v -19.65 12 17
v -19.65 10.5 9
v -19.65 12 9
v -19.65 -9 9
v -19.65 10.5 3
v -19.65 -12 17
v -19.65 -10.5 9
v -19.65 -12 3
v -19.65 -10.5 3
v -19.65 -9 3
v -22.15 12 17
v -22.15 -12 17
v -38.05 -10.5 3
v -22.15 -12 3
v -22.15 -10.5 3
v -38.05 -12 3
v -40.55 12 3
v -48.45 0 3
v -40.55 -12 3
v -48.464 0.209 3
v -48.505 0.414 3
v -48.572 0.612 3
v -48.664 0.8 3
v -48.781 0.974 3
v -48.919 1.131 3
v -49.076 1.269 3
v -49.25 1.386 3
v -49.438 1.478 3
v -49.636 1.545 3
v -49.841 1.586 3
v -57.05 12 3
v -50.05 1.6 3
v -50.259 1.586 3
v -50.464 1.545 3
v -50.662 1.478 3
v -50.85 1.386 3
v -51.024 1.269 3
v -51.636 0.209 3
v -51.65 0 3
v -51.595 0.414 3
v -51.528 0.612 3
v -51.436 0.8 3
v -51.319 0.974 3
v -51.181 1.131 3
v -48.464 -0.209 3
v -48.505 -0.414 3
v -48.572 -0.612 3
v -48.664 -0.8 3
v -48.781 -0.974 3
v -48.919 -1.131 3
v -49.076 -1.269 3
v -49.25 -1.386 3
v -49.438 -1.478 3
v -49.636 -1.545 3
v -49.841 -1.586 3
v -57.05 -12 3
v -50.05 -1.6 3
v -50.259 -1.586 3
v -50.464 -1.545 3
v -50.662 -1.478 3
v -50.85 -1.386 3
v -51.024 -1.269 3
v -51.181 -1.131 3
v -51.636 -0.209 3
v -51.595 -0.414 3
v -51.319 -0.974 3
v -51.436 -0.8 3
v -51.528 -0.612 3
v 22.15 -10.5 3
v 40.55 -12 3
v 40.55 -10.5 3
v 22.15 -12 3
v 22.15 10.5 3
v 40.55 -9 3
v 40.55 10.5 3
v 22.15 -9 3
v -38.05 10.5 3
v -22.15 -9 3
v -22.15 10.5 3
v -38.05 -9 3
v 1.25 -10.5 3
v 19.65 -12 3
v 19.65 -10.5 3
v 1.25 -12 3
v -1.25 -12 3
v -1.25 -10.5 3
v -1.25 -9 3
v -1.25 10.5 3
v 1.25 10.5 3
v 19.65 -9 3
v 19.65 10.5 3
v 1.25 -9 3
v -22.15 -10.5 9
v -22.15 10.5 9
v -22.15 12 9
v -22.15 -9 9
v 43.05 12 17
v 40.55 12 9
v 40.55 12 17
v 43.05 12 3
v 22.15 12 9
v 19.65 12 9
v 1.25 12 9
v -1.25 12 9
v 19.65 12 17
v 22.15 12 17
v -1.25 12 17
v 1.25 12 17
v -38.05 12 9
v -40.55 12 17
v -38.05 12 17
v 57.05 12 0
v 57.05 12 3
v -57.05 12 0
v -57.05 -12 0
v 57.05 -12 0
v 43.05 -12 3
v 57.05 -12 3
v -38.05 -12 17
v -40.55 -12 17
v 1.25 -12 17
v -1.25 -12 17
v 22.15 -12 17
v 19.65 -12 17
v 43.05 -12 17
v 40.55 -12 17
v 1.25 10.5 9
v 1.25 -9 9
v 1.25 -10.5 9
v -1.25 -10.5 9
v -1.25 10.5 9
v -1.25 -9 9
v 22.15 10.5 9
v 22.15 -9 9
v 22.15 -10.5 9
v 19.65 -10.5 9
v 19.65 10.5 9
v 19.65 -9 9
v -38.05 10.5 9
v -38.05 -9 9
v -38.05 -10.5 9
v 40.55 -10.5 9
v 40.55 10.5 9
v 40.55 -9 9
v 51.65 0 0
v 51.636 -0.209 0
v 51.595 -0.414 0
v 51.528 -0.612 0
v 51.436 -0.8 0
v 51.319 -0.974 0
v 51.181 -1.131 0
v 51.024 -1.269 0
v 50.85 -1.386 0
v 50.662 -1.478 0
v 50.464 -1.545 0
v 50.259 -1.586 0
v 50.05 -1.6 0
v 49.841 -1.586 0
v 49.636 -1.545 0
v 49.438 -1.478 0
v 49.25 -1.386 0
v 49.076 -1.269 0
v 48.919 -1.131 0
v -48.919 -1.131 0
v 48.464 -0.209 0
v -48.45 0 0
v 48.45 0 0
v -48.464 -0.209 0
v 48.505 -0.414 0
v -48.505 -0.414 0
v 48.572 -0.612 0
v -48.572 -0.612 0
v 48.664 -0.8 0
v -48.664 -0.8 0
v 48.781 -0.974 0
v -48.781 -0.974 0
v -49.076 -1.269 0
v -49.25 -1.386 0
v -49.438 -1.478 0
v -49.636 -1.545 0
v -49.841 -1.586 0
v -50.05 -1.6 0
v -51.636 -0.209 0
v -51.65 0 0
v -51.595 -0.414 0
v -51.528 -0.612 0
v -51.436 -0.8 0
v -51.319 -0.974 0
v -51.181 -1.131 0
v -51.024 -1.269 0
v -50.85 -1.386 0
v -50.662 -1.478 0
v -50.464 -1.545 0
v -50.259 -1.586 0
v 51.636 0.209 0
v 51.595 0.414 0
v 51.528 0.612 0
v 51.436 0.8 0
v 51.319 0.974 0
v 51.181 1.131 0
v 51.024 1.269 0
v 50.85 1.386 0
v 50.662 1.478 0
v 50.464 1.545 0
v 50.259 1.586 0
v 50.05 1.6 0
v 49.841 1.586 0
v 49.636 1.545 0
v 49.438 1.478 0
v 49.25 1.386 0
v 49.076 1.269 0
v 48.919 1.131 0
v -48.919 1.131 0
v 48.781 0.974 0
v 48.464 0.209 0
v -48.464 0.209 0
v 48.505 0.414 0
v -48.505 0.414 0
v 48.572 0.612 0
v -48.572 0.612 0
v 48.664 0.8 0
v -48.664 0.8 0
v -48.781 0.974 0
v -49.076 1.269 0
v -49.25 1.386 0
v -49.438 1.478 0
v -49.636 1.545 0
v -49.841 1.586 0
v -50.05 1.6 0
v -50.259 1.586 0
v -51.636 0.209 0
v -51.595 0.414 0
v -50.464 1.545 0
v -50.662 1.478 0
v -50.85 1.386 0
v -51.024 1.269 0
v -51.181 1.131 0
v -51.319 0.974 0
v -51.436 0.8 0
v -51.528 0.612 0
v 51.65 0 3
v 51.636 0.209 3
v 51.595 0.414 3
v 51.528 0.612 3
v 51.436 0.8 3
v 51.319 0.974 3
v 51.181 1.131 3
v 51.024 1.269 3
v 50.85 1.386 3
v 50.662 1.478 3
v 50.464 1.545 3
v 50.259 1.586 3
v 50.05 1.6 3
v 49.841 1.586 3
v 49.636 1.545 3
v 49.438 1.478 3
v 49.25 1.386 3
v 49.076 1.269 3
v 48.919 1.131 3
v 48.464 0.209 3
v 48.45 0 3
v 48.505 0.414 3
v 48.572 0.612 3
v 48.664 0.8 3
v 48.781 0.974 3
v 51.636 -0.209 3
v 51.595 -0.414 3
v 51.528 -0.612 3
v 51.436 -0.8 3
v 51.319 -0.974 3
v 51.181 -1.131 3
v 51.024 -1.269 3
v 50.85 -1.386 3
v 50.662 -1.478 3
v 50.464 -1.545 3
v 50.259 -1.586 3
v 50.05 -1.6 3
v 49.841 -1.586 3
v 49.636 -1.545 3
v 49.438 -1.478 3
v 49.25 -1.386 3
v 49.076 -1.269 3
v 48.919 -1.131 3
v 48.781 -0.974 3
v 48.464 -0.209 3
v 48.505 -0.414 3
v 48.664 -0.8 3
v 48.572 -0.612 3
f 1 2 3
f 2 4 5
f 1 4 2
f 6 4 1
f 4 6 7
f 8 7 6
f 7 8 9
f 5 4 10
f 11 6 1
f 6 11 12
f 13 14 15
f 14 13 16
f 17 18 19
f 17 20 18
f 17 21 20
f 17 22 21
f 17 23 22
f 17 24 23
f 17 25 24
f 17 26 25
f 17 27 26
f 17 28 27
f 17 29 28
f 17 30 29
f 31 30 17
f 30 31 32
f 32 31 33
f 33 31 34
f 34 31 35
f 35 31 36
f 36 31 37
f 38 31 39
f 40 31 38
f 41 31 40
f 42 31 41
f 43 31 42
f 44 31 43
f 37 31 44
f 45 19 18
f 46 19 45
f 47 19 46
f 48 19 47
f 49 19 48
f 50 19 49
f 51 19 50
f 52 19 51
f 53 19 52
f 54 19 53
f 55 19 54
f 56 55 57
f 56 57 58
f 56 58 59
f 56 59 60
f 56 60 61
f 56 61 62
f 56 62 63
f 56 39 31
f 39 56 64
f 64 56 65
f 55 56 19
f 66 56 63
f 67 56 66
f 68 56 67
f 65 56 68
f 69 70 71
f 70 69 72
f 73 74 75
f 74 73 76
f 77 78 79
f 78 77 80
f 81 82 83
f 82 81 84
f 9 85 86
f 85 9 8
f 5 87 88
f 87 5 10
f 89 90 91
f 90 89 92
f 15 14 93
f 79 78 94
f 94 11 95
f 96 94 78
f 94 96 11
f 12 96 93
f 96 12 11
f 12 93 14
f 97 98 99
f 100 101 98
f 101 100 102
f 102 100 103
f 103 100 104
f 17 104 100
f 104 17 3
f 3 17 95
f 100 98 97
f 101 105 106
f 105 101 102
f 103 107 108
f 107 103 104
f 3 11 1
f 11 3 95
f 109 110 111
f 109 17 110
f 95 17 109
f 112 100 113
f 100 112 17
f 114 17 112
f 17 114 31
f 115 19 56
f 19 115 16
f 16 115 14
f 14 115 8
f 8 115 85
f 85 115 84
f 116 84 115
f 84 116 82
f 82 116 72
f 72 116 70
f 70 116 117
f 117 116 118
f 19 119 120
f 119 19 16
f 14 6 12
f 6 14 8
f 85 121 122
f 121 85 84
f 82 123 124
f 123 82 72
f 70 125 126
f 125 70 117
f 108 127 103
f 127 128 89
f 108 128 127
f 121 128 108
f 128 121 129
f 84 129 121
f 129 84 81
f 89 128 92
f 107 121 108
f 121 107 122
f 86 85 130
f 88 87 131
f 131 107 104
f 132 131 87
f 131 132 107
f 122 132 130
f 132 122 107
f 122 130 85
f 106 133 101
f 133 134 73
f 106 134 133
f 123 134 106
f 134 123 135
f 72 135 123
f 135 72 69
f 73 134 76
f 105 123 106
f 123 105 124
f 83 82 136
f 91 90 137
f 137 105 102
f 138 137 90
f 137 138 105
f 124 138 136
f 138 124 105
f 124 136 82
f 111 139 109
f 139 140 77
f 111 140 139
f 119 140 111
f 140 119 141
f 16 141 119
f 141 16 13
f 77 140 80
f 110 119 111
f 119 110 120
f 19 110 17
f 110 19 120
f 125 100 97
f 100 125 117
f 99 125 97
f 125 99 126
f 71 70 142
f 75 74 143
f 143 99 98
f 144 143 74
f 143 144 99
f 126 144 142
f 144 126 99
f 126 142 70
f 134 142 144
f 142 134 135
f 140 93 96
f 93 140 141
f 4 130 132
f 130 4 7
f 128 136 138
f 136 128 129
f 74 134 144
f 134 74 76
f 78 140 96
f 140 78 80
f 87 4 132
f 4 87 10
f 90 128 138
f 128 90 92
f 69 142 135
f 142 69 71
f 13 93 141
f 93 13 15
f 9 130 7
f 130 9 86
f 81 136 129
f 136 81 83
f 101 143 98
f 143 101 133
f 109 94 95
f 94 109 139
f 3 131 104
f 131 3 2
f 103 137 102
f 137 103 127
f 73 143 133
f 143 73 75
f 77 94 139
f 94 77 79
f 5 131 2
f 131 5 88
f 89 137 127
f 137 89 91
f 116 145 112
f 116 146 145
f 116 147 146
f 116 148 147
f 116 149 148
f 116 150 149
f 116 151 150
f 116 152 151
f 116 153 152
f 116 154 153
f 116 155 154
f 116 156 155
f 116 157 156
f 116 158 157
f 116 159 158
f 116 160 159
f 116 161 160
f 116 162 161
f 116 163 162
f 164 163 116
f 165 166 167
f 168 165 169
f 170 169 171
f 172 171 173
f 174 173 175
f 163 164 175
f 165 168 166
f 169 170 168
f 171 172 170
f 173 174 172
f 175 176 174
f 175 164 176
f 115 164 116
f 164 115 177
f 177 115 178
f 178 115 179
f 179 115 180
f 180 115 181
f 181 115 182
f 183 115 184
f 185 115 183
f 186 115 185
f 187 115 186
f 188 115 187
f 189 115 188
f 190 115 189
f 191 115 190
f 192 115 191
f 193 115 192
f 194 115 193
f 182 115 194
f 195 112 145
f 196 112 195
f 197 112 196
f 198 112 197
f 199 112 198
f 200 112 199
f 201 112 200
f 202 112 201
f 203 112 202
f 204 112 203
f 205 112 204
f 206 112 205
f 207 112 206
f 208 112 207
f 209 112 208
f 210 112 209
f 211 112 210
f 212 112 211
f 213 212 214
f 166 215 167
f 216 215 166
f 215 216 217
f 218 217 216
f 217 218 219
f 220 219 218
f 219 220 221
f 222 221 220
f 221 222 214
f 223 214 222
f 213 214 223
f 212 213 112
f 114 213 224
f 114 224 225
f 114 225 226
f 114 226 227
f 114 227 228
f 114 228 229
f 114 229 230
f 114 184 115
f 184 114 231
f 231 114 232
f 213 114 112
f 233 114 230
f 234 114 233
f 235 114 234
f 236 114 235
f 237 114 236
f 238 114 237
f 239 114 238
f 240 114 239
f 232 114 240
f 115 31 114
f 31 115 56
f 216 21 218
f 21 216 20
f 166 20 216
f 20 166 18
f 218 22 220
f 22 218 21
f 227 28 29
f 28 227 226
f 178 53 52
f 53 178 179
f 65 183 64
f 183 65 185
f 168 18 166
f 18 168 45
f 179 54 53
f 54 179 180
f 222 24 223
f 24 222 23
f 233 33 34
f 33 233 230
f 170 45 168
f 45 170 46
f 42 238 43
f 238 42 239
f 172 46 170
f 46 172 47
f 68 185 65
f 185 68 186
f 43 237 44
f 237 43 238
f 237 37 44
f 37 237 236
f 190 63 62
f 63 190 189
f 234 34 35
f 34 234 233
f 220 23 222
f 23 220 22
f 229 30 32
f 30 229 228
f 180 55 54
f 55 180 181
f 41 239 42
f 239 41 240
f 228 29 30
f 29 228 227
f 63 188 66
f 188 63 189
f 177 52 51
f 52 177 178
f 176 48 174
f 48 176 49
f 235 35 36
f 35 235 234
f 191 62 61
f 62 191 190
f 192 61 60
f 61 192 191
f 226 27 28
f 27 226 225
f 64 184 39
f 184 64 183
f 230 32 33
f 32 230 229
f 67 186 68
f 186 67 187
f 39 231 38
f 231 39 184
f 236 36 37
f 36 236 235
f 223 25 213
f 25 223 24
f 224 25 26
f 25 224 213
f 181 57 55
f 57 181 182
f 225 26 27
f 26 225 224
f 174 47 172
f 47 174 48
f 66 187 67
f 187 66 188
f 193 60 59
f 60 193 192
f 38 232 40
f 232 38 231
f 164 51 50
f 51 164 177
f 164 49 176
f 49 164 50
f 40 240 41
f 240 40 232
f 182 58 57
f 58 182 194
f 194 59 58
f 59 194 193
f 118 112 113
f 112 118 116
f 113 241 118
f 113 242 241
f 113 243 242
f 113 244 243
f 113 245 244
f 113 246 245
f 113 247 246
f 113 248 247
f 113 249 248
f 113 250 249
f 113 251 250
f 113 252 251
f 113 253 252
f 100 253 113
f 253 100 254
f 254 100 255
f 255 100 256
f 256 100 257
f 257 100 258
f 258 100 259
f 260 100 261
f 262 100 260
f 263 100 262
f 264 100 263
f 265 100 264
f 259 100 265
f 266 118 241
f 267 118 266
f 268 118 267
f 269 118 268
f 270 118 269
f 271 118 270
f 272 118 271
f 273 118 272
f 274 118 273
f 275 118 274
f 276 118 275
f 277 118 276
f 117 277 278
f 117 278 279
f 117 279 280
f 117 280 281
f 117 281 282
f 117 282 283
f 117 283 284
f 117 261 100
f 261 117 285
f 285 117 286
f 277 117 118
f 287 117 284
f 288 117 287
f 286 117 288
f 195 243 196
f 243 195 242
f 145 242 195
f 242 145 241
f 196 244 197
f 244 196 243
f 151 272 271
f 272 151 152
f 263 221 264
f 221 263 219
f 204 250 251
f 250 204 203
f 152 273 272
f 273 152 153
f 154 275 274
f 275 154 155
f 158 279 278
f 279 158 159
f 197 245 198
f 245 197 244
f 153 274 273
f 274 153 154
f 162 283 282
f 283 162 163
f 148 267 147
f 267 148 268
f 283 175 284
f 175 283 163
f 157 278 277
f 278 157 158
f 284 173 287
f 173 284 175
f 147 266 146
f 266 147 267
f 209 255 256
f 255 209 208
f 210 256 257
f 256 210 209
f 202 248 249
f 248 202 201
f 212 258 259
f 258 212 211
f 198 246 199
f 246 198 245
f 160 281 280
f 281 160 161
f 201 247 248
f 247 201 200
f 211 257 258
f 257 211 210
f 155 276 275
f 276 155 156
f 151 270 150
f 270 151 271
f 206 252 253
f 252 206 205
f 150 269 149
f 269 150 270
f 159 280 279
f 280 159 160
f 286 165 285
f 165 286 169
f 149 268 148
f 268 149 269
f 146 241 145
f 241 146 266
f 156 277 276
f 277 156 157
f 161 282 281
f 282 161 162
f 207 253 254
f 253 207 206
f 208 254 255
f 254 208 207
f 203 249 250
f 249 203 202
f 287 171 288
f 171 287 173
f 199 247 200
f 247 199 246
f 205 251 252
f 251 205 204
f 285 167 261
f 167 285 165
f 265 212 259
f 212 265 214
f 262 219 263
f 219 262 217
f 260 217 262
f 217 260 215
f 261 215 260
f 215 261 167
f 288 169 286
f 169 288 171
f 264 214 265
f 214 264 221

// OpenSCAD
// Printed 4x1 18650 sled for the table fan
// Holds 4x 18650 cells inline for a 4S pack. Cells are wired in series with
// short jumpers (alternate cell direction); balance taps go to the 4S BMS.
// Secure cells with a wrap of Kapton tape once wired.
// Units: mm
//
// Placement in fan_housing.scad: bay floor, centered at (0, -66, 37)
// (X centered, Y on the floor, Z centered in the bay).

cell_d = 18.4;          // 18650 + clearance
cell_len = 65.4;
n_cells = 4;
rib_t = 2.5;
end_t = 2.5;
base_t = 3;
wall_h = 14;            // rib/end-wall height above the base
sled_w = 24;            // Z width

inner_len = n_cells*cell_d + (n_cells-1)*rib_t;   // 81.1
total_len = inner_len + 2*end_t;                  // ~86

$fn = 48;

module sled() {
    // base
    translate([-total_len/2, -sled_w/2, 0])
        cube([total_len, sled_w, base_t]);

    // divider ribs between cells
    for (i = [0 : n_cells-2]) {
        x = -inner_len/2 + cell_d + rib_t/2 + i*(cell_d + rib_t);
        translate([x - rib_t/2, -sled_w/2, base_t])
            cube([rib_t, sled_w, wall_h]);
    }

    // end walls (low so series jumper wires pass over the top)
    for (s = [-1, 1])
        translate([s*(total_len/2 - end_t), -sled_w/2, base_t])
            cube([end_t, sled_w, wall_h]);

    // side lips to keep cells from walking out sideways
    for (s = [-1, 1])
        translate([-inner_len/2, s*(sled_w/2 - 1.5), base_t])
            cube([inner_len, 1.5, 6]);

    // mounting ears with 3.2mm holes (optional: tape also works)
    for (s = [-1, 1])
        difference() {
            translate([s*(total_len/2) - (s > 0 ? 0 : 14), -sled_w/2, 0])
                cube([14, sled_w, base_t]);
            translate([s*(total_len/2 + 7), 0, -0.1])
                cylinder(d=3.2, h=base_t + 0.2);
        }
}

sled();

// ghost cells for fit check
%for (i = [0 : n_cells-1]) {
    x = -inner_len/2 + cell_d/2 + i*(cell_d + rib_t);
    translate([x, 0, base_t + cell_d/2])
        rotate([0, 90, 0]) cylinder(d=18, h=65, center=true);
}
